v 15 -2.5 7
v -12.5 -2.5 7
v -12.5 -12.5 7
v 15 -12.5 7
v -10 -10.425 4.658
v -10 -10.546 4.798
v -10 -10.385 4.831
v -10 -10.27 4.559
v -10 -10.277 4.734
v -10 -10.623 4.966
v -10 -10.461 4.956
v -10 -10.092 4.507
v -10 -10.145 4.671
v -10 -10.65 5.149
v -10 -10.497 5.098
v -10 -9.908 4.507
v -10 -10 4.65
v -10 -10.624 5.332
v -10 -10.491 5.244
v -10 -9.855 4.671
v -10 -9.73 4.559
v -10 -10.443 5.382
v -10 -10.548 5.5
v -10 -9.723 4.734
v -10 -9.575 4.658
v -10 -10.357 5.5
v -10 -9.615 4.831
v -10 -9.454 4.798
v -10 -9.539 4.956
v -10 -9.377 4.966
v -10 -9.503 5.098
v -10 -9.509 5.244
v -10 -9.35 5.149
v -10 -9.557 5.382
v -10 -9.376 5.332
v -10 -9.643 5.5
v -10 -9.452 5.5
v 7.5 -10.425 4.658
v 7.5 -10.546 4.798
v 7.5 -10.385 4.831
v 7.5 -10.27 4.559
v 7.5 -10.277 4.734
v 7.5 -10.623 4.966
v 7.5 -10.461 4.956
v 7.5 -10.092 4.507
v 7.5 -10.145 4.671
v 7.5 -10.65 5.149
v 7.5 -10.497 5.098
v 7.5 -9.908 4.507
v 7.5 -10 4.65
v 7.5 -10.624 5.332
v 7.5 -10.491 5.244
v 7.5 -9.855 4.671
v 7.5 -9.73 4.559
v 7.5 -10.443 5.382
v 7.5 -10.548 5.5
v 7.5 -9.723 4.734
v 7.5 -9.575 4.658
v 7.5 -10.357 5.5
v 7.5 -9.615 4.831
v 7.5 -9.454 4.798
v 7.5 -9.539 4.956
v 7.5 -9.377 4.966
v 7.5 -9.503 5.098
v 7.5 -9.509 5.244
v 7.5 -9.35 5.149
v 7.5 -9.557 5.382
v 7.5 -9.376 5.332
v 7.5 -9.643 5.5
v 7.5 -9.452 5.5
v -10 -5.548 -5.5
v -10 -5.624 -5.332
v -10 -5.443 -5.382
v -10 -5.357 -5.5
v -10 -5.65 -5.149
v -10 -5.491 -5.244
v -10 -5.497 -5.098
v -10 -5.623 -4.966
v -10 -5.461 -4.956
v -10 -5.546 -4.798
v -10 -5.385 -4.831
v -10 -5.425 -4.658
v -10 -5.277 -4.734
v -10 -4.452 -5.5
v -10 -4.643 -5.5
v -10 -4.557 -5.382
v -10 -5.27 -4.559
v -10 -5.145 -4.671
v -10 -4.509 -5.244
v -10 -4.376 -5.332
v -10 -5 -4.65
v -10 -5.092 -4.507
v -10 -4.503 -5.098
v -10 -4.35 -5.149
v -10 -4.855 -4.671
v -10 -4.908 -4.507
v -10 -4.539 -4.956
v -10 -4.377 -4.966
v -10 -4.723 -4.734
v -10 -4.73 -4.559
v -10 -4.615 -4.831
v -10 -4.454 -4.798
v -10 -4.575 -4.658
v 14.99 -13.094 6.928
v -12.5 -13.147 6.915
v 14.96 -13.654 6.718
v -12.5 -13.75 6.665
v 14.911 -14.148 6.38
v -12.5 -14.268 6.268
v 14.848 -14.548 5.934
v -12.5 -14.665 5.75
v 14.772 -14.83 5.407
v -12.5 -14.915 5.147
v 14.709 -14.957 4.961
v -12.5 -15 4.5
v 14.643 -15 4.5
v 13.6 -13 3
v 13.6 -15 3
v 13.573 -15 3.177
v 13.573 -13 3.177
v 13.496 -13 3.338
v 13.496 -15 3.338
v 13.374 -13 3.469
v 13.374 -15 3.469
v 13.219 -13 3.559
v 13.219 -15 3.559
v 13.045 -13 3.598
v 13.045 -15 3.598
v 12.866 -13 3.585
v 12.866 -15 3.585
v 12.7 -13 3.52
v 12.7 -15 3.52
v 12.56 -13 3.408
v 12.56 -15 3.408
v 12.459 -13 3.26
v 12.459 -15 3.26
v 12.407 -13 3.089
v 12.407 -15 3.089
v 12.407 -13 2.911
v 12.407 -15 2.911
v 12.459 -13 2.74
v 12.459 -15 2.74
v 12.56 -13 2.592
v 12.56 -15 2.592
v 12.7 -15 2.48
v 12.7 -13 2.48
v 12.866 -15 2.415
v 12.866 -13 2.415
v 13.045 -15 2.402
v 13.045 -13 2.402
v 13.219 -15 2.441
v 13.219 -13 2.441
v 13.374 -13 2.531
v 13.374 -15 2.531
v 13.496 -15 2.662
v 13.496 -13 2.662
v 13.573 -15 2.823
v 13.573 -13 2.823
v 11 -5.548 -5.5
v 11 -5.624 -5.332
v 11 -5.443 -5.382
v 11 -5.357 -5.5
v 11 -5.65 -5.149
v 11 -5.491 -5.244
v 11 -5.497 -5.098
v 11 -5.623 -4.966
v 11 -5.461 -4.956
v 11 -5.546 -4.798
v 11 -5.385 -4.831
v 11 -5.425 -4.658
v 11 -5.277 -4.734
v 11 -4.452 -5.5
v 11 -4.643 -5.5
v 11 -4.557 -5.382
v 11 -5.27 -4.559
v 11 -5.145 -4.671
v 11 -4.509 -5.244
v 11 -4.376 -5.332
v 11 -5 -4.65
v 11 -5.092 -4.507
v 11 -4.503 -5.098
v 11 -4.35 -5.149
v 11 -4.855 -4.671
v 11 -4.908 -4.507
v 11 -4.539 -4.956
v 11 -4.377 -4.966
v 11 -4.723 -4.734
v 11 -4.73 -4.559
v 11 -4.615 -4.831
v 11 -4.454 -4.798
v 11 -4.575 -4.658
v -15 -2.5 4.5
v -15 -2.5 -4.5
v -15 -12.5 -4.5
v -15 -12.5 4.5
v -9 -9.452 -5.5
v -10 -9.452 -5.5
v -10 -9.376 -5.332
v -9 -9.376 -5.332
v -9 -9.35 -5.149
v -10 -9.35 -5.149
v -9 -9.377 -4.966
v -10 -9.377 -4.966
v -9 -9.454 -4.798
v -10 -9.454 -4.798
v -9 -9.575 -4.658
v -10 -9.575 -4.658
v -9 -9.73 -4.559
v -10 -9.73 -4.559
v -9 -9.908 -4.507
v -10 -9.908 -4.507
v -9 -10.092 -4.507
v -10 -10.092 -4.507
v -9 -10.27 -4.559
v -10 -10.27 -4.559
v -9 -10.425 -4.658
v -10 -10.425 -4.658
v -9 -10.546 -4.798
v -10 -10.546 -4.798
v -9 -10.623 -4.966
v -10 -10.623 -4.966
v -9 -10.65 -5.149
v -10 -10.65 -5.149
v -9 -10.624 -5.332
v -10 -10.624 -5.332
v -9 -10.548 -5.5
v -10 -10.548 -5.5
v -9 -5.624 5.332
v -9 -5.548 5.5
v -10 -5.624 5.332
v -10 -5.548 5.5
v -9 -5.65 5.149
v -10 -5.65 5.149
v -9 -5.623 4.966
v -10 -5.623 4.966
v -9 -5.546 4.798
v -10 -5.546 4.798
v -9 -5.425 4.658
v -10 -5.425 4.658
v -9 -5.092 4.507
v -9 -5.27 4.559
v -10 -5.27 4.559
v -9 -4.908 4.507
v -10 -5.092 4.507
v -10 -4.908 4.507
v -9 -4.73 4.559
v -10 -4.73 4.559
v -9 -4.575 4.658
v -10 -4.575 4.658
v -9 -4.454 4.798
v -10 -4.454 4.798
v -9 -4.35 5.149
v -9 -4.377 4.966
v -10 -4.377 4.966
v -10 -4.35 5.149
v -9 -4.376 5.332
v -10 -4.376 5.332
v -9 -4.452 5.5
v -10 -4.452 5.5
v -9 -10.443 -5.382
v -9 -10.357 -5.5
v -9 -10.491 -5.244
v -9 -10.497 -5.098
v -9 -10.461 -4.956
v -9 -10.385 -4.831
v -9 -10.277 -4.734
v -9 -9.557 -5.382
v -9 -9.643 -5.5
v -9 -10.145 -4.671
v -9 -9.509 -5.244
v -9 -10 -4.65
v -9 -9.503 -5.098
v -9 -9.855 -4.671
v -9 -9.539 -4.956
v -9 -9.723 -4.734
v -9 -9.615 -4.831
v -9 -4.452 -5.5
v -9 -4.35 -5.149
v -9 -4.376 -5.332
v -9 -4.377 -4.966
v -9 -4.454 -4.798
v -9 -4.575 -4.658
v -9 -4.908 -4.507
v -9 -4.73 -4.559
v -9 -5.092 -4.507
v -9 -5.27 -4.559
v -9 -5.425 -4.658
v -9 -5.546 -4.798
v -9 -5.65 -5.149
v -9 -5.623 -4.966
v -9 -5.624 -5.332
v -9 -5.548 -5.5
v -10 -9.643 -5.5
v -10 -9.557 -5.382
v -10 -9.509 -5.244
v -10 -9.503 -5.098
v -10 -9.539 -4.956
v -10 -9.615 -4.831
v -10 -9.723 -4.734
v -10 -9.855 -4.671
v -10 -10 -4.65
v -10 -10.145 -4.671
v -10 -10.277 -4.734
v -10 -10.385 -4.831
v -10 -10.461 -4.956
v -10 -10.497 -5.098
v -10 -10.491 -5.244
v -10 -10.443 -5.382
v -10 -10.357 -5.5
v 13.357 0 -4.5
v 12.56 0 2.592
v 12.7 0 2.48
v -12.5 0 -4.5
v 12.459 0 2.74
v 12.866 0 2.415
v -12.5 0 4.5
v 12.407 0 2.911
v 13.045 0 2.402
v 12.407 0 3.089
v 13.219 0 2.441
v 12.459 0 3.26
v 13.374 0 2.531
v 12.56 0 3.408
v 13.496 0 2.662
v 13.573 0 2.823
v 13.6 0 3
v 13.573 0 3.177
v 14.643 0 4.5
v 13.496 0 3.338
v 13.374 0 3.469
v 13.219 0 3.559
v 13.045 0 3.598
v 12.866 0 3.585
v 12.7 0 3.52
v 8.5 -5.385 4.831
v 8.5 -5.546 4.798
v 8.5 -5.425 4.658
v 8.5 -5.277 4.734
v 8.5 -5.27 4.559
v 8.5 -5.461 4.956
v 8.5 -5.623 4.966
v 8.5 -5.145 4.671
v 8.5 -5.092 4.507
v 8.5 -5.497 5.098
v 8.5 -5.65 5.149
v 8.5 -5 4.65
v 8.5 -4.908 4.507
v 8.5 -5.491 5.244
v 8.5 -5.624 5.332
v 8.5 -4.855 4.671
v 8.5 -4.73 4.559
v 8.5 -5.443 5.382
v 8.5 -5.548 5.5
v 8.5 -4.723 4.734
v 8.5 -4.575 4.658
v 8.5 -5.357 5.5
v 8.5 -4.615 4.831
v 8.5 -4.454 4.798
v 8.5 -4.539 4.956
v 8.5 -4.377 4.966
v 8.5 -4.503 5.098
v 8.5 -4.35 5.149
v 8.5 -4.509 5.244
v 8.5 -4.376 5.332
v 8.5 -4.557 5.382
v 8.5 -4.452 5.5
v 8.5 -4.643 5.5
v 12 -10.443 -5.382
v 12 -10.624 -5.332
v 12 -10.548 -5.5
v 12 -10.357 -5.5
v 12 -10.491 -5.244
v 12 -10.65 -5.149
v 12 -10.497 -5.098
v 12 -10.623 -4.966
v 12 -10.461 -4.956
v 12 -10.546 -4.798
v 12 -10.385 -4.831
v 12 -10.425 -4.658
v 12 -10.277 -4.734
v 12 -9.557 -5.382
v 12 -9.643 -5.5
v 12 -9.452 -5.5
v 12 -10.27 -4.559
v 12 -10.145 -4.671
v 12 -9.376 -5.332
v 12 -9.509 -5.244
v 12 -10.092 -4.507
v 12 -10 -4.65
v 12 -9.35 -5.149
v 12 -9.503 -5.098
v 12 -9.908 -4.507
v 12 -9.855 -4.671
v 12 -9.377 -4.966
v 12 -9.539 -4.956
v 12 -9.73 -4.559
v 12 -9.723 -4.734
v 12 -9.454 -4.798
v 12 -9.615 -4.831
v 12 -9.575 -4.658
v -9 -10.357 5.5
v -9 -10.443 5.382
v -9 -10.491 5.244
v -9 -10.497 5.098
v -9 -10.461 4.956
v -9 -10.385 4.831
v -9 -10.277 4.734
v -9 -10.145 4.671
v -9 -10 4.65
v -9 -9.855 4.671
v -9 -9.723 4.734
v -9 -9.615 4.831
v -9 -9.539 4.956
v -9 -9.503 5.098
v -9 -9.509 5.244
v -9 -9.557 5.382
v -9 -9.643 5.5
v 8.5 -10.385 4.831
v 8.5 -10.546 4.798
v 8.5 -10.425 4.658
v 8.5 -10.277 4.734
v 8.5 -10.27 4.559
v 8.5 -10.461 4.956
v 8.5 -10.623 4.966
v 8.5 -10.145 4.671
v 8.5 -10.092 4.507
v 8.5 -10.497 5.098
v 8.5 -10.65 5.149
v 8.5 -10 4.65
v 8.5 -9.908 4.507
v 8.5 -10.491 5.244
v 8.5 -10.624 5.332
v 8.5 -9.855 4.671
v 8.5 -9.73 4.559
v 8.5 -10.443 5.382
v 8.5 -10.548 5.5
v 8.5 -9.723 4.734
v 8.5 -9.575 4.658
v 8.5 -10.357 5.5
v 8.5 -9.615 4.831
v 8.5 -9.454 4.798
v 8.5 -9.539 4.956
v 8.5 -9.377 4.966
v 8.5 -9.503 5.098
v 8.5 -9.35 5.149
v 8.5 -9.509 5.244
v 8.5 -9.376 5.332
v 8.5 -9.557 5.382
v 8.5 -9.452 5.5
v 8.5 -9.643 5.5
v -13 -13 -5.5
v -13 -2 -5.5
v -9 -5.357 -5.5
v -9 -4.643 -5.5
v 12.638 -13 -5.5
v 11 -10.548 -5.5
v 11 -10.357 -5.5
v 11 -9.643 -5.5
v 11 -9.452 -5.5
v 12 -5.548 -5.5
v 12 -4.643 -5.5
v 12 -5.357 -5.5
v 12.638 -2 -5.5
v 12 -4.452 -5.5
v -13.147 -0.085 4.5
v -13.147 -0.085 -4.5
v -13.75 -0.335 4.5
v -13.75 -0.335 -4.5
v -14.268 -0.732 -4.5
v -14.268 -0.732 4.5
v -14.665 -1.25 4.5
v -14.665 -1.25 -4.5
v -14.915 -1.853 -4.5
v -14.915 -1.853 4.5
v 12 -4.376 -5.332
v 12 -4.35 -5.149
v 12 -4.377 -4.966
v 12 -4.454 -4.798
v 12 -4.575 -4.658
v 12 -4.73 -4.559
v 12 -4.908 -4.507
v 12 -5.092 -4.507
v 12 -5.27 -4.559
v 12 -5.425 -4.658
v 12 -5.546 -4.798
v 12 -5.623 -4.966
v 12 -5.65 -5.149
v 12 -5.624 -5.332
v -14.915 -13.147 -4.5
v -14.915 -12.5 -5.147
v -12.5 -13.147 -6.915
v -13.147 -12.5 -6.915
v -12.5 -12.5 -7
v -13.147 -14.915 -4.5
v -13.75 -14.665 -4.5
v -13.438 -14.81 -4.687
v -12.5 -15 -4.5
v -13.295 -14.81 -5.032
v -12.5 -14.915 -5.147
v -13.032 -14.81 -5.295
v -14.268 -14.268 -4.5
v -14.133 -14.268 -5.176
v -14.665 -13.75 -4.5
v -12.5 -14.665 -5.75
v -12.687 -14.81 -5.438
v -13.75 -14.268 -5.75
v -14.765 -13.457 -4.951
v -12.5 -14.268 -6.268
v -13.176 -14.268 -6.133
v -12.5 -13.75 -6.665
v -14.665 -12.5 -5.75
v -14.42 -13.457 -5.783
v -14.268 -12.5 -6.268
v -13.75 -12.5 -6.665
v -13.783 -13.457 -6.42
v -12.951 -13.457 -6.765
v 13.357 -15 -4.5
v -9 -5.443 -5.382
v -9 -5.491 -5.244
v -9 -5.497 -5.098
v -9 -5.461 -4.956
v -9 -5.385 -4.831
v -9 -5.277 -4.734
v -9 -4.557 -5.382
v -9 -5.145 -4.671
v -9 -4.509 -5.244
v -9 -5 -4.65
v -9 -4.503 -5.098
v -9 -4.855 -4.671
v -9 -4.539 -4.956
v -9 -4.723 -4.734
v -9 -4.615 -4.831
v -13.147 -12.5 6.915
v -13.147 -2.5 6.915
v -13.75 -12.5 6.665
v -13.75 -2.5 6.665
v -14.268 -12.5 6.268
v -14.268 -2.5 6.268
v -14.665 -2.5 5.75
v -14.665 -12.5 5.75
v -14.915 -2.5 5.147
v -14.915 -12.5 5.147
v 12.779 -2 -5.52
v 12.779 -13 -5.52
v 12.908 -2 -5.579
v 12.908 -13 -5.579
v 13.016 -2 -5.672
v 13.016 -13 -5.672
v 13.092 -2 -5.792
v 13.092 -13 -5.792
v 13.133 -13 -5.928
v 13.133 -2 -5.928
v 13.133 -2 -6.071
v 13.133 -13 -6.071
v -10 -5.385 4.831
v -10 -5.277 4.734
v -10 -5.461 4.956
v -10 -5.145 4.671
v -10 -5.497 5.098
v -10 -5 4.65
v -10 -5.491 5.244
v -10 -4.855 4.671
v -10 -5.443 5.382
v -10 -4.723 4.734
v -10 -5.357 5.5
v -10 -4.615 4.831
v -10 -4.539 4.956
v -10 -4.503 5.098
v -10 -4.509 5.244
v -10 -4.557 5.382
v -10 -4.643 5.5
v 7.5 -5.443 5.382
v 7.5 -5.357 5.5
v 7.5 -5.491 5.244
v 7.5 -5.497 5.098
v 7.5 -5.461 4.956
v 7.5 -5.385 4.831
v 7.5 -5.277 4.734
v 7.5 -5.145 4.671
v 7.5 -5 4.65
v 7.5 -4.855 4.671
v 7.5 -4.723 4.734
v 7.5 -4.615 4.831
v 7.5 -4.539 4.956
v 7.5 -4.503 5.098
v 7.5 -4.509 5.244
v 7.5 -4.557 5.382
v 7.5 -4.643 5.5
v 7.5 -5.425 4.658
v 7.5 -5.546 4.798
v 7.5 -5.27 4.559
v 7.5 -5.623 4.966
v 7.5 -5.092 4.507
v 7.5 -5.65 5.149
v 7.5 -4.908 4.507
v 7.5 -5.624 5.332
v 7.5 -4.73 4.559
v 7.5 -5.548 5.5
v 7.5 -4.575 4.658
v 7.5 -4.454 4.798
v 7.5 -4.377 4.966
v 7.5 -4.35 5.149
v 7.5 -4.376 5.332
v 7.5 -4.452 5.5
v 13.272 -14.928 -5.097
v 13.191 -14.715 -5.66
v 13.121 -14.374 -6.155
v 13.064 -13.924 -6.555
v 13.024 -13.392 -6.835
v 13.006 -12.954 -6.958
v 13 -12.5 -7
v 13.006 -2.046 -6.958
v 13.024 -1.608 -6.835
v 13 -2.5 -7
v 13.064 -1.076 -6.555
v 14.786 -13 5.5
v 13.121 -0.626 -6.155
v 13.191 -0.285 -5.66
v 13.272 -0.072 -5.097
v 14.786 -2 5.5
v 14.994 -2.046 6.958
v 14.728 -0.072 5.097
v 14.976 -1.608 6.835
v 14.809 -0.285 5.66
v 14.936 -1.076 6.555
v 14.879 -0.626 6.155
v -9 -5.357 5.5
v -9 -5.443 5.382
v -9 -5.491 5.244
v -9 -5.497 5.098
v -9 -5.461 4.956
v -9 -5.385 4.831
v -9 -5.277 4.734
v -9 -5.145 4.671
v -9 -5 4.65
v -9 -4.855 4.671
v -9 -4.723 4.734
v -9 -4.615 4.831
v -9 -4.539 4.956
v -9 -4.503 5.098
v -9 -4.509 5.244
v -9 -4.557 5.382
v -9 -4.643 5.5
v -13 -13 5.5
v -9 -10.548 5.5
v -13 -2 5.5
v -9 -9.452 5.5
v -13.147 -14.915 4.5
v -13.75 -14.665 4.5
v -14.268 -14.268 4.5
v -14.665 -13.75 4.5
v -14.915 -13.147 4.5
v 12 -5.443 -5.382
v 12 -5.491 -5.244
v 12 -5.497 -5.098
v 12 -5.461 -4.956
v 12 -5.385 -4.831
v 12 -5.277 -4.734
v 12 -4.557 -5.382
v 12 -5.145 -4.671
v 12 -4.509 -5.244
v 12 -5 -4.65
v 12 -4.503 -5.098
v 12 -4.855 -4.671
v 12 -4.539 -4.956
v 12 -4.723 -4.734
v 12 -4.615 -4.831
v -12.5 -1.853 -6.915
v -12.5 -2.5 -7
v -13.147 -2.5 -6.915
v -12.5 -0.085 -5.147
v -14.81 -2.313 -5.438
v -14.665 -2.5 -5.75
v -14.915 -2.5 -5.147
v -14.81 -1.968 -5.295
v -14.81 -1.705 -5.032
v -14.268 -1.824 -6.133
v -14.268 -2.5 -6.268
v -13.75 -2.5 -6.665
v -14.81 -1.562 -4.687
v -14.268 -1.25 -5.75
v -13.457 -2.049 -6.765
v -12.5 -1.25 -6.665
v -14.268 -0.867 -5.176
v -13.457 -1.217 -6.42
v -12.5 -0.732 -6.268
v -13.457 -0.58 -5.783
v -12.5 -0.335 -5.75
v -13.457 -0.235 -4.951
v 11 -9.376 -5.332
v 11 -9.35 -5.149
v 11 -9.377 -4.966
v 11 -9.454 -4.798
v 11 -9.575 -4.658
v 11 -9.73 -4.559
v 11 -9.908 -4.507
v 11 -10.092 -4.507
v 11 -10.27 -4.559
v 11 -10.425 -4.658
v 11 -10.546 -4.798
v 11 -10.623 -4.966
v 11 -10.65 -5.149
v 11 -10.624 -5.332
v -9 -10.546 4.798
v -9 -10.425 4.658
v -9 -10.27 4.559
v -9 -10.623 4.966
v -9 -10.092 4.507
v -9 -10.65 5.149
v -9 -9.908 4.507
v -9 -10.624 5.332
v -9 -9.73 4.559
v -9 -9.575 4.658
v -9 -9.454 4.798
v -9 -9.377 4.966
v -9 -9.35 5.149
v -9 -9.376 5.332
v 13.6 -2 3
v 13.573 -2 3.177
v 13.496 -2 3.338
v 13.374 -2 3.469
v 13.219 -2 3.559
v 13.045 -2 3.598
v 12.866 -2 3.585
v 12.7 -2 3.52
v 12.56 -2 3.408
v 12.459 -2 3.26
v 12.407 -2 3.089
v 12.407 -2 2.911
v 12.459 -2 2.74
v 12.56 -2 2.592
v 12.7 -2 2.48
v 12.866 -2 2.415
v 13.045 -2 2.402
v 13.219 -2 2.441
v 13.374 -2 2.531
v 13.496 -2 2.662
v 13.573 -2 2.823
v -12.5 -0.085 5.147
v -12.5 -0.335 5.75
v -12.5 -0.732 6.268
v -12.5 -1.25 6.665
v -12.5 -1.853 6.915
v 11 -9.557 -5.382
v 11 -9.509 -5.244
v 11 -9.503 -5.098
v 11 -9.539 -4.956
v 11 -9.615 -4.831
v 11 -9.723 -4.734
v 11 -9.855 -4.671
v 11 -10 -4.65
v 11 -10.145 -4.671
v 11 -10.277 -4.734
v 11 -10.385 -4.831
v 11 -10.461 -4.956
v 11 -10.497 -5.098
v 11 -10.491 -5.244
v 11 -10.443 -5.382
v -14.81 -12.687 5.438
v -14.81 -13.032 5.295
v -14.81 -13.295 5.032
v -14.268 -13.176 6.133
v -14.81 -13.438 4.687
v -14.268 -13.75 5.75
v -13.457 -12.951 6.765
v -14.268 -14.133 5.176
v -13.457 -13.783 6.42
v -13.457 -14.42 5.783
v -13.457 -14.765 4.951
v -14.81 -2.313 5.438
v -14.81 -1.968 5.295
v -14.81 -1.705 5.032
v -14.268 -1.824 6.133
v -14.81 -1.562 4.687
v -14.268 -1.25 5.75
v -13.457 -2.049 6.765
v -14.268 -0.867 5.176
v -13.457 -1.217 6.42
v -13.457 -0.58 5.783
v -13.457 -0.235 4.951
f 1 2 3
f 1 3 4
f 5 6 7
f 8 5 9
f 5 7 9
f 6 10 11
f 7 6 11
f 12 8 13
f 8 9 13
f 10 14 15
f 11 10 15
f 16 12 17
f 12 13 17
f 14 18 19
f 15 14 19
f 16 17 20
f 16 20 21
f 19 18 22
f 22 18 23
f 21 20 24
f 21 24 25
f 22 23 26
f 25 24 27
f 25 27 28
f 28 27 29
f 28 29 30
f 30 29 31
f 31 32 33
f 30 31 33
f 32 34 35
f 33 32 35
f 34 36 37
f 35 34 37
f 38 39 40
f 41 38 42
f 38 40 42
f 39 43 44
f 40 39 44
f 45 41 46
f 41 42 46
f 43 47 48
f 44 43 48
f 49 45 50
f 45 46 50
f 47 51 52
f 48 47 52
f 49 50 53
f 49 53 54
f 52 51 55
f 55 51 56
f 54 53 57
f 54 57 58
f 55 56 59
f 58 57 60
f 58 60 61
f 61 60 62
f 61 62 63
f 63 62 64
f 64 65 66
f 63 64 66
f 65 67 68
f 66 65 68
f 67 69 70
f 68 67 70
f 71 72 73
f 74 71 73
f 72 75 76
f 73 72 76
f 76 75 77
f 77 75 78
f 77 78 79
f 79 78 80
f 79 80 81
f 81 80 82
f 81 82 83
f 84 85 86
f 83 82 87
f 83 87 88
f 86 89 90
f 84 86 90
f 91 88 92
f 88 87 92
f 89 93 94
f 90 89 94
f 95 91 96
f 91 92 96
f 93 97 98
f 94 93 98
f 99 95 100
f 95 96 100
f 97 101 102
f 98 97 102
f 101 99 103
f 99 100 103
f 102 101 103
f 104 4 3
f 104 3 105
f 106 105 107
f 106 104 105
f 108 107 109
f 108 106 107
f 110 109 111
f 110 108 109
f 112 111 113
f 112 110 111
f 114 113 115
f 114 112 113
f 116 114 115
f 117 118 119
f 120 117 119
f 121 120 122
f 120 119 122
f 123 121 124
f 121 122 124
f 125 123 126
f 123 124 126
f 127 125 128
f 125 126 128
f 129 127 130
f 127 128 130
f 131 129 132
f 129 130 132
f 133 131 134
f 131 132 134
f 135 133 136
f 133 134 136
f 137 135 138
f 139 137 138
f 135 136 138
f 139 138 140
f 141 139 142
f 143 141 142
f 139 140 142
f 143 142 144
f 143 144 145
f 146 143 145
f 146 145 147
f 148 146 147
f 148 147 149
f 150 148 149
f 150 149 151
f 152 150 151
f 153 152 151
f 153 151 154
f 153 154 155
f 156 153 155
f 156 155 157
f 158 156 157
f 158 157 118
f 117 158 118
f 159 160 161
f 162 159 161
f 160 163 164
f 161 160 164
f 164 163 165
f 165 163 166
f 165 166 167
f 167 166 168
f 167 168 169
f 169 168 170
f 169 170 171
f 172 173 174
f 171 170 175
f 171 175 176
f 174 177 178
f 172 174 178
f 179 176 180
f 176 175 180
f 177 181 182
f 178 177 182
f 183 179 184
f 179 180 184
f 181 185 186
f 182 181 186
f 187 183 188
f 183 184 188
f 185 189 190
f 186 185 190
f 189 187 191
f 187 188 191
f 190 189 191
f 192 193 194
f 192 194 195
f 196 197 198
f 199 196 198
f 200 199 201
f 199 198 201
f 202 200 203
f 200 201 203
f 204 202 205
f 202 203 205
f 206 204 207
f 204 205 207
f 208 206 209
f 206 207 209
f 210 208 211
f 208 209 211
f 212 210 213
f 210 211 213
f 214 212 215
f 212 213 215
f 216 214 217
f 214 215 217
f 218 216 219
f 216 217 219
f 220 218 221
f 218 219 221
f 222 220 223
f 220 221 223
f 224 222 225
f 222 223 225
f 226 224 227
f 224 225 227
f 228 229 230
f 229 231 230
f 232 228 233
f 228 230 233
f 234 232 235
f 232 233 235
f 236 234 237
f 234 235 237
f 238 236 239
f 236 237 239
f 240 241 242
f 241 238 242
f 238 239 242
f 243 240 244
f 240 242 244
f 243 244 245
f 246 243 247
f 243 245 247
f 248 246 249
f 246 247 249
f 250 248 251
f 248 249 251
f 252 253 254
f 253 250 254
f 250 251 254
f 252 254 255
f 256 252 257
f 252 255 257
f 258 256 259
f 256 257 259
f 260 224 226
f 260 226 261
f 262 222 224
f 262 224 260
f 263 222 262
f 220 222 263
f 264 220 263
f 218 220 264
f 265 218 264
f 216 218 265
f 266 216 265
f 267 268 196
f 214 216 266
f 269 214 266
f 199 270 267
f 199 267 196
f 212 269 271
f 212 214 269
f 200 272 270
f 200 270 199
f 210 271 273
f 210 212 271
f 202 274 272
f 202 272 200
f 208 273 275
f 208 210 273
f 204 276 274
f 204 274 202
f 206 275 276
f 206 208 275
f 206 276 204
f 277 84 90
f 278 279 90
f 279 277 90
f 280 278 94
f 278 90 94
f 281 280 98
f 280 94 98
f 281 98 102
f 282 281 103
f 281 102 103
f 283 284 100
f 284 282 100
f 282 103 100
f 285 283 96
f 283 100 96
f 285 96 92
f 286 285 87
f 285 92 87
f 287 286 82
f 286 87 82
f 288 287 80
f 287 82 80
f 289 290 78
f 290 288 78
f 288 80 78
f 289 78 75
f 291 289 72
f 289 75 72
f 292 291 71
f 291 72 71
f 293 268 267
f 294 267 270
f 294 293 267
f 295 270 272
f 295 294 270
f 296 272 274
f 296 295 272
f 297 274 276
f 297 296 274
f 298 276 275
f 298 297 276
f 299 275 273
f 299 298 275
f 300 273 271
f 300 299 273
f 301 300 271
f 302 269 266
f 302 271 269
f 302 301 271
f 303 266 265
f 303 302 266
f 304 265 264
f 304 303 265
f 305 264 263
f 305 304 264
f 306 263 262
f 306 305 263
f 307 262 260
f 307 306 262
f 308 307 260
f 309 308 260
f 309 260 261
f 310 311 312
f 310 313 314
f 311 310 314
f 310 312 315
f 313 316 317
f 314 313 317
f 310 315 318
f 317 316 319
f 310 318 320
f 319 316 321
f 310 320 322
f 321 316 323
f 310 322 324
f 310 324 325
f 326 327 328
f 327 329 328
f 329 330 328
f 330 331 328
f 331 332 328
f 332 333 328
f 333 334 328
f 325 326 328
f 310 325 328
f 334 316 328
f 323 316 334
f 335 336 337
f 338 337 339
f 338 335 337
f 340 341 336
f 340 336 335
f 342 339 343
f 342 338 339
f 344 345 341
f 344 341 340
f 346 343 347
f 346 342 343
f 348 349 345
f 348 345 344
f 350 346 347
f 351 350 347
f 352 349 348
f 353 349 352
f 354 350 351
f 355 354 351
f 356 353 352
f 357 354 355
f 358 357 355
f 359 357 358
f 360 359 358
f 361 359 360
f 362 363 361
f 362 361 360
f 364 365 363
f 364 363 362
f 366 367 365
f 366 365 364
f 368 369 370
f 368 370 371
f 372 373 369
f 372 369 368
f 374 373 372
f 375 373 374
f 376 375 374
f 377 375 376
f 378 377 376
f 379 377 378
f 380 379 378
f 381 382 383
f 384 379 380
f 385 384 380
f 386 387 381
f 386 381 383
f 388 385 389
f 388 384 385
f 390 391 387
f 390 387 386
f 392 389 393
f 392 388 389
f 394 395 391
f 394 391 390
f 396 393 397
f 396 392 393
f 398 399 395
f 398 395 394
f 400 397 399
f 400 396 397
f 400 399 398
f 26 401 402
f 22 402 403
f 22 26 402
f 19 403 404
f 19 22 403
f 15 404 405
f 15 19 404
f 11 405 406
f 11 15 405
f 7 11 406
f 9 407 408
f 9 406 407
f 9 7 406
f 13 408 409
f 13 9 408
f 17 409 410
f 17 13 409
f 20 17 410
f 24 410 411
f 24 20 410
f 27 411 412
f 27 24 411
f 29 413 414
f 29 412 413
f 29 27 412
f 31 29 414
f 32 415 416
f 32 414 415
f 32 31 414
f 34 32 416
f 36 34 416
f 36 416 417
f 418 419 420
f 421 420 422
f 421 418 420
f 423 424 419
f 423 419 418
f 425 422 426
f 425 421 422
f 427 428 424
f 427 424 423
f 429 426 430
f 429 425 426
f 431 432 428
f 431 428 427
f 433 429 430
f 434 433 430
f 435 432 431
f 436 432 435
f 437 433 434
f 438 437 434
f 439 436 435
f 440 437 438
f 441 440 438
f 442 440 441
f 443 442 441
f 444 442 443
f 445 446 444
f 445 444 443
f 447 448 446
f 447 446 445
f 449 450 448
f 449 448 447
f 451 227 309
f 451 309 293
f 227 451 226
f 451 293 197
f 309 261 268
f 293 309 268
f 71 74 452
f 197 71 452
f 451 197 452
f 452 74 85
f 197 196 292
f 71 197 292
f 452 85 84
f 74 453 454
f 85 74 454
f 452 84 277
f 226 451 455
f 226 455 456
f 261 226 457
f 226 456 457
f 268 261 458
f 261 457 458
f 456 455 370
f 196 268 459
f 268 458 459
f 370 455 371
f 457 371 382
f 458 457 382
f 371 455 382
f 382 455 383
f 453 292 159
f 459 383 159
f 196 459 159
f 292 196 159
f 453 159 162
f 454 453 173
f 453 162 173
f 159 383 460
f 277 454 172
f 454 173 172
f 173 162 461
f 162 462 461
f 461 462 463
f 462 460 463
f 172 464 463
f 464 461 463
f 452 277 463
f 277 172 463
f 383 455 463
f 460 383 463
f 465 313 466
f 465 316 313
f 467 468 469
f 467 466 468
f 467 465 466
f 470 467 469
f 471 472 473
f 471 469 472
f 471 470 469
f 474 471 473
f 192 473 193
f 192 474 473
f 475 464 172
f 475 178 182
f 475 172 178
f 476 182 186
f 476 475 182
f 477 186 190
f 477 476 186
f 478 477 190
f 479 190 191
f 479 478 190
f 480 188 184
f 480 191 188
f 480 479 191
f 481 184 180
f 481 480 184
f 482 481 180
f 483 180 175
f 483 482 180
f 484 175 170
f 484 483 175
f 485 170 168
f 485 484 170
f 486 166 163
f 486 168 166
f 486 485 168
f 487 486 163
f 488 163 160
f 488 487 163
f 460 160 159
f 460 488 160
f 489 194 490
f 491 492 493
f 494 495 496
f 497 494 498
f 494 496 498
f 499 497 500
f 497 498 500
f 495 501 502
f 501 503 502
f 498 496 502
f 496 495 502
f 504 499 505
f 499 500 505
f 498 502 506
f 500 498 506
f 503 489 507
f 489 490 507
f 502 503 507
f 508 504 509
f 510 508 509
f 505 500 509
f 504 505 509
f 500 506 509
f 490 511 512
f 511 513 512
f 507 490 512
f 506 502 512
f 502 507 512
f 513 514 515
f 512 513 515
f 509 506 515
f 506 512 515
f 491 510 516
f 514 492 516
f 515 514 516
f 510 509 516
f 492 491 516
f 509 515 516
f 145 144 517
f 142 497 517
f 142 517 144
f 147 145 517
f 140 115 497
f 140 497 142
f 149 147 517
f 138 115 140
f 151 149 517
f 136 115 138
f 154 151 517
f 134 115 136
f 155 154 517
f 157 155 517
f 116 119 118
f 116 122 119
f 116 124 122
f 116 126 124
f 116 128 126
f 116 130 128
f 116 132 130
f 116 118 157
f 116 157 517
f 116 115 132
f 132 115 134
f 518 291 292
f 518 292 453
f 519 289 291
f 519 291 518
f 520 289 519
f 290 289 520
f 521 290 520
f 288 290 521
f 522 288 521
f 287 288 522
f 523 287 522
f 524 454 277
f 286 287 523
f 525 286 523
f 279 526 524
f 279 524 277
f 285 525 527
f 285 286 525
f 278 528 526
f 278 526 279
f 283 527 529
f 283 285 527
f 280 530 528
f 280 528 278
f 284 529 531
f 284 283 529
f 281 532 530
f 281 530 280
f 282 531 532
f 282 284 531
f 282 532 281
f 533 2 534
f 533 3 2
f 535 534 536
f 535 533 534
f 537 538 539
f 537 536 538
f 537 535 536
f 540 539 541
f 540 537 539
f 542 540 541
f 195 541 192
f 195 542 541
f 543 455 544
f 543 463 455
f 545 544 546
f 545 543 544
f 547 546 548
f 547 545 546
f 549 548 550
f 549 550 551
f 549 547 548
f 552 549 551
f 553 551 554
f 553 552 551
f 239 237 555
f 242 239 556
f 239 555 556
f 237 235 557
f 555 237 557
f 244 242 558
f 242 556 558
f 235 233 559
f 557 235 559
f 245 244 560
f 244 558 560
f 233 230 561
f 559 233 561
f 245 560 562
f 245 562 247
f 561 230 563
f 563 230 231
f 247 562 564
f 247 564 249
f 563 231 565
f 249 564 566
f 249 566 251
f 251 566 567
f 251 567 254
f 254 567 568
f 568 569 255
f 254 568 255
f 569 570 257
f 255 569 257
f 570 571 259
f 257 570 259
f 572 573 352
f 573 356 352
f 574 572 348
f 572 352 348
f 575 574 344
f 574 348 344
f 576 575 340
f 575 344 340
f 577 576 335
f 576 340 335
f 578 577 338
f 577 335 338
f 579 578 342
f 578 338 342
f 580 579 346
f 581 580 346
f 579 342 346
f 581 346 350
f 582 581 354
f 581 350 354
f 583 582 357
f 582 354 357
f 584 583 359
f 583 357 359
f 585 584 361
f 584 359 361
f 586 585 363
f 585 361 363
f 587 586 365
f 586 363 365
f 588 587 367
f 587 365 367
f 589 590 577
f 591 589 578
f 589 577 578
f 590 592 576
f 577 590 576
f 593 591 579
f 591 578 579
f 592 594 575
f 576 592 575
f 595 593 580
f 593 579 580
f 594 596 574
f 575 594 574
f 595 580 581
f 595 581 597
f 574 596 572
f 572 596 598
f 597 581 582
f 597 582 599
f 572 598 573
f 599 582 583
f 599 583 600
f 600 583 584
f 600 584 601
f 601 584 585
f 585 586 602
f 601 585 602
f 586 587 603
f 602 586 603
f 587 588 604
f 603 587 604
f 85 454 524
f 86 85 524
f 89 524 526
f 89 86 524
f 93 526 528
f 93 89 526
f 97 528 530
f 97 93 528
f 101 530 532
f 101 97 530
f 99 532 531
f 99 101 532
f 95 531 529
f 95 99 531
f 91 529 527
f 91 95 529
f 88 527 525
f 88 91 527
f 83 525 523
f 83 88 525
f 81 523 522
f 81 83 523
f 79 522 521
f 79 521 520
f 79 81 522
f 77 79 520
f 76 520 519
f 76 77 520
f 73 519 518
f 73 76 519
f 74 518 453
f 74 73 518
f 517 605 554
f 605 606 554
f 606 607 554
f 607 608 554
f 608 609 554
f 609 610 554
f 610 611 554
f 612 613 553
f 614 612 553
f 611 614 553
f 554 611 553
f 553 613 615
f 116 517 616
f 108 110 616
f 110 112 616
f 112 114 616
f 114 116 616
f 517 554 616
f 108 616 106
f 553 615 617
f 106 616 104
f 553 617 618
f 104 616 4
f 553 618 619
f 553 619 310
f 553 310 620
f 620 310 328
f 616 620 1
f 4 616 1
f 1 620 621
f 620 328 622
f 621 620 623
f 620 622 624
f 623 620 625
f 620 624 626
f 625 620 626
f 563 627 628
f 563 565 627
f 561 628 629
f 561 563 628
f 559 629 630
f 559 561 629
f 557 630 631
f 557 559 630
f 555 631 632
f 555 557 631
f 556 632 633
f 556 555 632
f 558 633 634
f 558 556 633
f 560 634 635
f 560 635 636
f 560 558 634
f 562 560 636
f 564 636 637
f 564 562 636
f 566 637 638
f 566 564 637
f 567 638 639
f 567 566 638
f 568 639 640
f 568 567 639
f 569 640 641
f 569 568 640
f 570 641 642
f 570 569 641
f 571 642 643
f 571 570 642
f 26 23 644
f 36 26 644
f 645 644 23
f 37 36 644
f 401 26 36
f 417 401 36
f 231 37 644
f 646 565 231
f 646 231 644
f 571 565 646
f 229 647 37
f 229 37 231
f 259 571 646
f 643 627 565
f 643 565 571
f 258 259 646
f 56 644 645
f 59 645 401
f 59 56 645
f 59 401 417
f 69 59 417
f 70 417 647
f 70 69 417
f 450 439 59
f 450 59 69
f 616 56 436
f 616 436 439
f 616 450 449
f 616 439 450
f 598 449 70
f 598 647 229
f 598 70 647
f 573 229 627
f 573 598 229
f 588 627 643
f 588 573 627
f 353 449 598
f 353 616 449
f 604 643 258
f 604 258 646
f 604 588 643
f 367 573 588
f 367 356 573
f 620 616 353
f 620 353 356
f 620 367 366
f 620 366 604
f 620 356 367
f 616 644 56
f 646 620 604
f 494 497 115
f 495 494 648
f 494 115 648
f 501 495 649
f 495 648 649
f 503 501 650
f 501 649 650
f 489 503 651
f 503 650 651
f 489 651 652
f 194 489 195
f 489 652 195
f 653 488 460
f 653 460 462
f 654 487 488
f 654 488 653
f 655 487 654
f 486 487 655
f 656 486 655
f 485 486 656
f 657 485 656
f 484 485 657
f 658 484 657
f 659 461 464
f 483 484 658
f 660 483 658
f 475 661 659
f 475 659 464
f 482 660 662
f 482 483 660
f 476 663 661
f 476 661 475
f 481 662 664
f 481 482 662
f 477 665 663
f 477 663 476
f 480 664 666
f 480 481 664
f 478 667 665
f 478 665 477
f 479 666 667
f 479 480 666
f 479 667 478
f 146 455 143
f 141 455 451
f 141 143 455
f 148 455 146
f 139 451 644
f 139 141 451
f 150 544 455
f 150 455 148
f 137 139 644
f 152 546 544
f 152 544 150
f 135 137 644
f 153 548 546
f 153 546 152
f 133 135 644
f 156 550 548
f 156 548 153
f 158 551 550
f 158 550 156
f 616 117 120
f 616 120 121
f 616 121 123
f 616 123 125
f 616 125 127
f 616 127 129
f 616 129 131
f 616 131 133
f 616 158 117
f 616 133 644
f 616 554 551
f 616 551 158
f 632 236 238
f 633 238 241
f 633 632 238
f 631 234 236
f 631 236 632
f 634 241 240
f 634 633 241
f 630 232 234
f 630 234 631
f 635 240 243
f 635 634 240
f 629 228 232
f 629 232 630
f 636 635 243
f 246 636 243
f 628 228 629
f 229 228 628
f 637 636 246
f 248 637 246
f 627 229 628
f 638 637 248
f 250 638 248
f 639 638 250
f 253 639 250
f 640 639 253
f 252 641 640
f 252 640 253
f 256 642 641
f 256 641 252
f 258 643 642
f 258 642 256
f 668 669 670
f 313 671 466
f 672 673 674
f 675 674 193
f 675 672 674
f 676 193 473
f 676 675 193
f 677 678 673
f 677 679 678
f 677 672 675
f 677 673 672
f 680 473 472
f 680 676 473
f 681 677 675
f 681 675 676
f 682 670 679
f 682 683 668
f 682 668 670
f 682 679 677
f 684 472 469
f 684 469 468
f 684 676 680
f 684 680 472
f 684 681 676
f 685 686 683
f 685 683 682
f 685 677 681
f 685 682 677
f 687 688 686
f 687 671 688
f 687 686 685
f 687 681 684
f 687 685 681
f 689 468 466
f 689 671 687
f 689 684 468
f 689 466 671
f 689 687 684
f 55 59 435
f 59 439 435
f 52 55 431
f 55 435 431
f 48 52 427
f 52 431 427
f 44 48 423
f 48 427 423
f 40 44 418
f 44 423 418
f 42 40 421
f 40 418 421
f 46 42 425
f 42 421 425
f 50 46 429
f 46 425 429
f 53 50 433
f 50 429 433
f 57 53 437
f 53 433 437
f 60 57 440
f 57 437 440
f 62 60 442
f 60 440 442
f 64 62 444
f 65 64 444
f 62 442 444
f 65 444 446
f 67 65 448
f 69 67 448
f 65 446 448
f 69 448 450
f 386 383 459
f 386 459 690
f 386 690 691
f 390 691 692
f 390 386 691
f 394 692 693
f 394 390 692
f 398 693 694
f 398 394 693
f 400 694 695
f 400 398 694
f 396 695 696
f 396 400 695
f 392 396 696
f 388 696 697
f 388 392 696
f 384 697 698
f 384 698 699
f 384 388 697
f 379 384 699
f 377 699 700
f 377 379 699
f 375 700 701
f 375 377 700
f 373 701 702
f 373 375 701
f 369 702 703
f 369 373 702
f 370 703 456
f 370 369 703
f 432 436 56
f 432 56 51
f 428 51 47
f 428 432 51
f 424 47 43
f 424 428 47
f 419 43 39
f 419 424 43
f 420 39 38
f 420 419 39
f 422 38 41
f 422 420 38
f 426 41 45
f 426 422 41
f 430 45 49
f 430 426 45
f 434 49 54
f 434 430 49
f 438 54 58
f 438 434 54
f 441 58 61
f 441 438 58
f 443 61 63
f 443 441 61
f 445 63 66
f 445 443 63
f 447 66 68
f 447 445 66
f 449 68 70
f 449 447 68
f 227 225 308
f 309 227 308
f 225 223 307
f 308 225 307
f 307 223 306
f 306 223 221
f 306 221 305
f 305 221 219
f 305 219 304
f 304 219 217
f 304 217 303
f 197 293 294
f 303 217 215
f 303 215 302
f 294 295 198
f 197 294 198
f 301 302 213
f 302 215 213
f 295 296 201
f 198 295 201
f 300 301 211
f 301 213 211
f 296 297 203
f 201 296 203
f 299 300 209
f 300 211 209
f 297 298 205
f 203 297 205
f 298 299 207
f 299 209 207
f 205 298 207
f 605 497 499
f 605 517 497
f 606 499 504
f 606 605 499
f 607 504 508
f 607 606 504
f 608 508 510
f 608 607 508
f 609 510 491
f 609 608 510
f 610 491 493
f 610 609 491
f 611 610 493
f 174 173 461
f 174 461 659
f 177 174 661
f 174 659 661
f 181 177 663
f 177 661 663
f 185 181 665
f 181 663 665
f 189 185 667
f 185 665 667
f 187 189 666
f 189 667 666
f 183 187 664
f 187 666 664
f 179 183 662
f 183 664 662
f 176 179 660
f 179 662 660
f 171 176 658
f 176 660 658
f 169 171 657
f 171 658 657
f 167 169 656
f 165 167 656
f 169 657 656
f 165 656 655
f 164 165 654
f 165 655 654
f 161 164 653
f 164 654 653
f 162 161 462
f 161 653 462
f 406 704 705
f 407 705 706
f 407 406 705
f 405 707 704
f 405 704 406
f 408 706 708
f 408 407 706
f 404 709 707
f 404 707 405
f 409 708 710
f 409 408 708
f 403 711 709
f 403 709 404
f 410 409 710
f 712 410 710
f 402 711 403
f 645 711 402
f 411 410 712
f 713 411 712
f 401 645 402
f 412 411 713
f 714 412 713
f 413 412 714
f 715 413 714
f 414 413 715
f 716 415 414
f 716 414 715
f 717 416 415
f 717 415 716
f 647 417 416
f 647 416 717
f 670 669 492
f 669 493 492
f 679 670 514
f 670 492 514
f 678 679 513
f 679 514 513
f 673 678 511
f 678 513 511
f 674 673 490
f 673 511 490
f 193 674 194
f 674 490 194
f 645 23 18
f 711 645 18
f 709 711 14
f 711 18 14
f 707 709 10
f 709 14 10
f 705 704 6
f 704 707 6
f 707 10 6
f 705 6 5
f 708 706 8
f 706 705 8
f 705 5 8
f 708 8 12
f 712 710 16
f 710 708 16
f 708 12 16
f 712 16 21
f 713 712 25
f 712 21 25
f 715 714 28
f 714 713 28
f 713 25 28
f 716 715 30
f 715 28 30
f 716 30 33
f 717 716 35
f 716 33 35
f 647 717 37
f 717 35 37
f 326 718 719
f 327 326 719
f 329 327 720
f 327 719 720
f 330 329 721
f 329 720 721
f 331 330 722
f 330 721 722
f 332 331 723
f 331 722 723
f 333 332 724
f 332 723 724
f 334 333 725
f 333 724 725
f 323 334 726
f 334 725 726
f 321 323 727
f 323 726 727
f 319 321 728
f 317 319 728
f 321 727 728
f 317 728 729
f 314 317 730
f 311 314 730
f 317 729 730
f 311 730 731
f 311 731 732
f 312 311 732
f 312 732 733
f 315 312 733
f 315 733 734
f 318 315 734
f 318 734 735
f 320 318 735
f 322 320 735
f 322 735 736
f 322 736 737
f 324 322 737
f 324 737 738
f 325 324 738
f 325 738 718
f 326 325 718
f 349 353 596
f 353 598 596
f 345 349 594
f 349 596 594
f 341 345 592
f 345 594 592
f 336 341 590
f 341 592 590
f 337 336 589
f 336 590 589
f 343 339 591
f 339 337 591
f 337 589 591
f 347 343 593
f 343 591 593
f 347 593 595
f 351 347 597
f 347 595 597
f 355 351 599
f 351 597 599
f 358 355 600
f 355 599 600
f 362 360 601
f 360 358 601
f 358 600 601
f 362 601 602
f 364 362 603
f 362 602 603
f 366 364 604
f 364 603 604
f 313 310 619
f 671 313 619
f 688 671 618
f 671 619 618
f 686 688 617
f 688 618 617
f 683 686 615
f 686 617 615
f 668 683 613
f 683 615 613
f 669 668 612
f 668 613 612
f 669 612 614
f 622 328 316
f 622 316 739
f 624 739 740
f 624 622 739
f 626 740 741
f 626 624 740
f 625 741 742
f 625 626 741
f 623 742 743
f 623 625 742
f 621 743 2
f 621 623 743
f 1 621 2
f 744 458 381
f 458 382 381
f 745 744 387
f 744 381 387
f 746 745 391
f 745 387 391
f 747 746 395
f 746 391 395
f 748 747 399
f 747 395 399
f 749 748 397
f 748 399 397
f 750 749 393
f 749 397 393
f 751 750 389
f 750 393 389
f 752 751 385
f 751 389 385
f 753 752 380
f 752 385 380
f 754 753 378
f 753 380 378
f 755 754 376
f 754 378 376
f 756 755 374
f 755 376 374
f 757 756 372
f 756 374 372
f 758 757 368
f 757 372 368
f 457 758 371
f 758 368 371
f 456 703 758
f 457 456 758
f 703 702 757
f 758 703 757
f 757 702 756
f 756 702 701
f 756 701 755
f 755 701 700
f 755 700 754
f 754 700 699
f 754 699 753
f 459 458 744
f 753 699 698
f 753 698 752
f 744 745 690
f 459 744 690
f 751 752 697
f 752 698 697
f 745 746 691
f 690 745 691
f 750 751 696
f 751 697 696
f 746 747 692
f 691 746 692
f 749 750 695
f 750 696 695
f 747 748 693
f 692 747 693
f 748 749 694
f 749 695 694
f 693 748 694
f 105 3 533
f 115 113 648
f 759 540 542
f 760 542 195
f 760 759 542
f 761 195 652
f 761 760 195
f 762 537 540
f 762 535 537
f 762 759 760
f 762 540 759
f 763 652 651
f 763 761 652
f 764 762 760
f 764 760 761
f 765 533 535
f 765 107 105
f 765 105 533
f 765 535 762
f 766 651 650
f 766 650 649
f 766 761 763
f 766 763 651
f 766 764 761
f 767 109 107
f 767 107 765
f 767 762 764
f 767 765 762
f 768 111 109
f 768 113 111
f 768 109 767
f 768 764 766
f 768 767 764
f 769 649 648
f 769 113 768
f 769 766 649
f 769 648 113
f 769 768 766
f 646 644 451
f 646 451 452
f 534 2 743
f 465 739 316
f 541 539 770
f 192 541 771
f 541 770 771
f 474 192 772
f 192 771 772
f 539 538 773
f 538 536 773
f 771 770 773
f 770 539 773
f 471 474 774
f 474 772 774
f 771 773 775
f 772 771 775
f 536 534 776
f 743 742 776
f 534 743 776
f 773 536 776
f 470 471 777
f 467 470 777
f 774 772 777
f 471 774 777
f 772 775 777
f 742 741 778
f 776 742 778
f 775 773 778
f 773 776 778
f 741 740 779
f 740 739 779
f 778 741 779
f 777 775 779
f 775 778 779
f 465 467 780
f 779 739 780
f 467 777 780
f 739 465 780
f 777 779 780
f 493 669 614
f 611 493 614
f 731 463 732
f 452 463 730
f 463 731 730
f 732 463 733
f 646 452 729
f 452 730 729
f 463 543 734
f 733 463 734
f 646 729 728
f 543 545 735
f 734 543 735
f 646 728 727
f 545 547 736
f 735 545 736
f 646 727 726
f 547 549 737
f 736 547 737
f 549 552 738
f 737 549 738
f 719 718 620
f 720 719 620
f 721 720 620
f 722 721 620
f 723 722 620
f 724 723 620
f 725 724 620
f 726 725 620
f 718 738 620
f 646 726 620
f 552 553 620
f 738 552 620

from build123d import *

# Parameters (mm, degrees)
F0_W           = 30
F0_H           = 14
F1_DEPTH       = 15
F2_W           = 11
F2_H           = 11
F3_DEPTH       = 28
F5_R           = 0.65
F5_R_2         = 0.5
F6_DEPTH       = 1
F8_DEPTH       = 25
F9_R           = 2.5
F10_R          = 0.6
F11_DEPTH      = 20
F13_R          = 0.65
F13_R_2        = 0.5
F14_DEPTH      = 1
F15_R          = 0.5
F17_R          = 0.65
F17_R_2        = 0.5
F18_DEPTH      = 0.5
F18_DEPTH_BACK = 0.5
F19_R          = 0.65
F19_R_2        = 0.5
F20_DEPTH      = 1


with BuildPart() as f1:
    # F0 (on Front) → F1 (new body)
    with BuildSketch(Plane.XZ):
        Rectangle(F0_W, F0_H)
    extrude(amount=F1_DEPTH)

    # F2 (on face) → F3 (cut)
    with BuildSketch(Plane.YZ.offset(15)):
        with Locations((-7.5, 0)):
            Rectangle(F2_W, F2_H)
    extrude(amount=-F3_DEPTH, mode=Mode.SUBTRACT)

    # F5 (on offset) → F6 (join)
    with BuildSketch(Plane.YZ.offset(12)):
        with Locations((-10, -5.15)):
            Circle(F5_R)
        with Locations((-10, -5.15)):
            Circle(F5_R_2, mode=Mode.SUBTRACT)
        with Locations((-5, -5.15)):
            Circle(F5_R)
        with Locations((-5, -5.15)):
            Circle(F5_R_2, mode=Mode.SUBTRACT)
    extrude(amount=-F6_DEPTH)

    # F7 (on face) → F8 (cut)
    with BuildSketch(Plane(origin=(0, 0, 0), x_dir=(-1, 0, 0), z_dir=(0, 1, 0))):
        Polygon((-13, -7), (-15, 7), (-15, -7), align=None)
    extrude(amount=-F8_DEPTH, mode=Mode.SUBTRACT)

    # F9
    f9_edges = [f1.edges().sort_by_distance(p)[0] for p in [
        (0, 0, 7),
        (0, -15, 7),
        (-1, 0, -7),
        (-15, -7.5, 7),
        (-15, -7.5, -7),
        (-15, 0, 0),
        (-15, -15, 0),
        (-1, -15, -7),
    ]]
    fillet(f9_edges, radius=F9_R)

    # F10 (on face) → F11 (cut)
    with BuildSketch(Plane.XZ.offset(15)):
        with Locations((13, 3)):
            Circle(F10_R)
    extrude(amount=-F11_DEPTH, mode=Mode.SUBTRACT)

    # F13 (on offset) → F14 (join)
    with BuildSketch(Plane.YZ.offset(-10)):
        with Locations((-10, -5.15)):
            Circle(F13_R)
        with Locations((-10, -5.15)):
            Circle(F13_R_2, mode=Mode.SUBTRACT)
        with Locations((-5, -5.15)):
            Circle(F13_R)
        with Locations((-5, -5.15)):
            Circle(F13_R_2, mode=Mode.SUBTRACT)
    extrude(amount=F14_DEPTH)

    # F15
    f15_edges = [f1.edges().sort_by_distance(p)[0] for p in [
        (13.214286, -7.5, -5.5),
    ]]
    fillet(f15_edges, radius=F15_R)

    # F17 (on offset) → F18 (join, two sides)
    with BuildSketch(Plane.YZ.offset(8)) as f18_sk:
        with Locations((-10, 5.15)):
            Circle(F17_R)
        with Locations((-10, 5.15)):
            Circle(F17_R_2, mode=Mode.SUBTRACT)
        with Locations((-5, 5.15)):
            Circle(F17_R)
        with Locations((-5, 5.15)):
            Circle(F17_R_2, mode=Mode.SUBTRACT)
    extrude(amount=F18_DEPTH)
    extrude(f18_sk.sketch, amount=-F18_DEPTH_BACK)

    # F19 (on offset) → F20 (join)
    with BuildSketch(Plane.YZ.offset(-10)):
        with Locations((-10, 5.15)):
            Circle(F19_R)
        with Locations((-10, 5.15)):
            Circle(F19_R_2, mode=Mode.SUBTRACT)
        with Locations((-5, 5.15)):
            Circle(F19_R)
        with Locations((-5, 5.15)):
            Circle(F19_R_2, mode=Mode.SUBTRACT)
    extrude(amount=F20_DEPTH)


solid = f1.part
